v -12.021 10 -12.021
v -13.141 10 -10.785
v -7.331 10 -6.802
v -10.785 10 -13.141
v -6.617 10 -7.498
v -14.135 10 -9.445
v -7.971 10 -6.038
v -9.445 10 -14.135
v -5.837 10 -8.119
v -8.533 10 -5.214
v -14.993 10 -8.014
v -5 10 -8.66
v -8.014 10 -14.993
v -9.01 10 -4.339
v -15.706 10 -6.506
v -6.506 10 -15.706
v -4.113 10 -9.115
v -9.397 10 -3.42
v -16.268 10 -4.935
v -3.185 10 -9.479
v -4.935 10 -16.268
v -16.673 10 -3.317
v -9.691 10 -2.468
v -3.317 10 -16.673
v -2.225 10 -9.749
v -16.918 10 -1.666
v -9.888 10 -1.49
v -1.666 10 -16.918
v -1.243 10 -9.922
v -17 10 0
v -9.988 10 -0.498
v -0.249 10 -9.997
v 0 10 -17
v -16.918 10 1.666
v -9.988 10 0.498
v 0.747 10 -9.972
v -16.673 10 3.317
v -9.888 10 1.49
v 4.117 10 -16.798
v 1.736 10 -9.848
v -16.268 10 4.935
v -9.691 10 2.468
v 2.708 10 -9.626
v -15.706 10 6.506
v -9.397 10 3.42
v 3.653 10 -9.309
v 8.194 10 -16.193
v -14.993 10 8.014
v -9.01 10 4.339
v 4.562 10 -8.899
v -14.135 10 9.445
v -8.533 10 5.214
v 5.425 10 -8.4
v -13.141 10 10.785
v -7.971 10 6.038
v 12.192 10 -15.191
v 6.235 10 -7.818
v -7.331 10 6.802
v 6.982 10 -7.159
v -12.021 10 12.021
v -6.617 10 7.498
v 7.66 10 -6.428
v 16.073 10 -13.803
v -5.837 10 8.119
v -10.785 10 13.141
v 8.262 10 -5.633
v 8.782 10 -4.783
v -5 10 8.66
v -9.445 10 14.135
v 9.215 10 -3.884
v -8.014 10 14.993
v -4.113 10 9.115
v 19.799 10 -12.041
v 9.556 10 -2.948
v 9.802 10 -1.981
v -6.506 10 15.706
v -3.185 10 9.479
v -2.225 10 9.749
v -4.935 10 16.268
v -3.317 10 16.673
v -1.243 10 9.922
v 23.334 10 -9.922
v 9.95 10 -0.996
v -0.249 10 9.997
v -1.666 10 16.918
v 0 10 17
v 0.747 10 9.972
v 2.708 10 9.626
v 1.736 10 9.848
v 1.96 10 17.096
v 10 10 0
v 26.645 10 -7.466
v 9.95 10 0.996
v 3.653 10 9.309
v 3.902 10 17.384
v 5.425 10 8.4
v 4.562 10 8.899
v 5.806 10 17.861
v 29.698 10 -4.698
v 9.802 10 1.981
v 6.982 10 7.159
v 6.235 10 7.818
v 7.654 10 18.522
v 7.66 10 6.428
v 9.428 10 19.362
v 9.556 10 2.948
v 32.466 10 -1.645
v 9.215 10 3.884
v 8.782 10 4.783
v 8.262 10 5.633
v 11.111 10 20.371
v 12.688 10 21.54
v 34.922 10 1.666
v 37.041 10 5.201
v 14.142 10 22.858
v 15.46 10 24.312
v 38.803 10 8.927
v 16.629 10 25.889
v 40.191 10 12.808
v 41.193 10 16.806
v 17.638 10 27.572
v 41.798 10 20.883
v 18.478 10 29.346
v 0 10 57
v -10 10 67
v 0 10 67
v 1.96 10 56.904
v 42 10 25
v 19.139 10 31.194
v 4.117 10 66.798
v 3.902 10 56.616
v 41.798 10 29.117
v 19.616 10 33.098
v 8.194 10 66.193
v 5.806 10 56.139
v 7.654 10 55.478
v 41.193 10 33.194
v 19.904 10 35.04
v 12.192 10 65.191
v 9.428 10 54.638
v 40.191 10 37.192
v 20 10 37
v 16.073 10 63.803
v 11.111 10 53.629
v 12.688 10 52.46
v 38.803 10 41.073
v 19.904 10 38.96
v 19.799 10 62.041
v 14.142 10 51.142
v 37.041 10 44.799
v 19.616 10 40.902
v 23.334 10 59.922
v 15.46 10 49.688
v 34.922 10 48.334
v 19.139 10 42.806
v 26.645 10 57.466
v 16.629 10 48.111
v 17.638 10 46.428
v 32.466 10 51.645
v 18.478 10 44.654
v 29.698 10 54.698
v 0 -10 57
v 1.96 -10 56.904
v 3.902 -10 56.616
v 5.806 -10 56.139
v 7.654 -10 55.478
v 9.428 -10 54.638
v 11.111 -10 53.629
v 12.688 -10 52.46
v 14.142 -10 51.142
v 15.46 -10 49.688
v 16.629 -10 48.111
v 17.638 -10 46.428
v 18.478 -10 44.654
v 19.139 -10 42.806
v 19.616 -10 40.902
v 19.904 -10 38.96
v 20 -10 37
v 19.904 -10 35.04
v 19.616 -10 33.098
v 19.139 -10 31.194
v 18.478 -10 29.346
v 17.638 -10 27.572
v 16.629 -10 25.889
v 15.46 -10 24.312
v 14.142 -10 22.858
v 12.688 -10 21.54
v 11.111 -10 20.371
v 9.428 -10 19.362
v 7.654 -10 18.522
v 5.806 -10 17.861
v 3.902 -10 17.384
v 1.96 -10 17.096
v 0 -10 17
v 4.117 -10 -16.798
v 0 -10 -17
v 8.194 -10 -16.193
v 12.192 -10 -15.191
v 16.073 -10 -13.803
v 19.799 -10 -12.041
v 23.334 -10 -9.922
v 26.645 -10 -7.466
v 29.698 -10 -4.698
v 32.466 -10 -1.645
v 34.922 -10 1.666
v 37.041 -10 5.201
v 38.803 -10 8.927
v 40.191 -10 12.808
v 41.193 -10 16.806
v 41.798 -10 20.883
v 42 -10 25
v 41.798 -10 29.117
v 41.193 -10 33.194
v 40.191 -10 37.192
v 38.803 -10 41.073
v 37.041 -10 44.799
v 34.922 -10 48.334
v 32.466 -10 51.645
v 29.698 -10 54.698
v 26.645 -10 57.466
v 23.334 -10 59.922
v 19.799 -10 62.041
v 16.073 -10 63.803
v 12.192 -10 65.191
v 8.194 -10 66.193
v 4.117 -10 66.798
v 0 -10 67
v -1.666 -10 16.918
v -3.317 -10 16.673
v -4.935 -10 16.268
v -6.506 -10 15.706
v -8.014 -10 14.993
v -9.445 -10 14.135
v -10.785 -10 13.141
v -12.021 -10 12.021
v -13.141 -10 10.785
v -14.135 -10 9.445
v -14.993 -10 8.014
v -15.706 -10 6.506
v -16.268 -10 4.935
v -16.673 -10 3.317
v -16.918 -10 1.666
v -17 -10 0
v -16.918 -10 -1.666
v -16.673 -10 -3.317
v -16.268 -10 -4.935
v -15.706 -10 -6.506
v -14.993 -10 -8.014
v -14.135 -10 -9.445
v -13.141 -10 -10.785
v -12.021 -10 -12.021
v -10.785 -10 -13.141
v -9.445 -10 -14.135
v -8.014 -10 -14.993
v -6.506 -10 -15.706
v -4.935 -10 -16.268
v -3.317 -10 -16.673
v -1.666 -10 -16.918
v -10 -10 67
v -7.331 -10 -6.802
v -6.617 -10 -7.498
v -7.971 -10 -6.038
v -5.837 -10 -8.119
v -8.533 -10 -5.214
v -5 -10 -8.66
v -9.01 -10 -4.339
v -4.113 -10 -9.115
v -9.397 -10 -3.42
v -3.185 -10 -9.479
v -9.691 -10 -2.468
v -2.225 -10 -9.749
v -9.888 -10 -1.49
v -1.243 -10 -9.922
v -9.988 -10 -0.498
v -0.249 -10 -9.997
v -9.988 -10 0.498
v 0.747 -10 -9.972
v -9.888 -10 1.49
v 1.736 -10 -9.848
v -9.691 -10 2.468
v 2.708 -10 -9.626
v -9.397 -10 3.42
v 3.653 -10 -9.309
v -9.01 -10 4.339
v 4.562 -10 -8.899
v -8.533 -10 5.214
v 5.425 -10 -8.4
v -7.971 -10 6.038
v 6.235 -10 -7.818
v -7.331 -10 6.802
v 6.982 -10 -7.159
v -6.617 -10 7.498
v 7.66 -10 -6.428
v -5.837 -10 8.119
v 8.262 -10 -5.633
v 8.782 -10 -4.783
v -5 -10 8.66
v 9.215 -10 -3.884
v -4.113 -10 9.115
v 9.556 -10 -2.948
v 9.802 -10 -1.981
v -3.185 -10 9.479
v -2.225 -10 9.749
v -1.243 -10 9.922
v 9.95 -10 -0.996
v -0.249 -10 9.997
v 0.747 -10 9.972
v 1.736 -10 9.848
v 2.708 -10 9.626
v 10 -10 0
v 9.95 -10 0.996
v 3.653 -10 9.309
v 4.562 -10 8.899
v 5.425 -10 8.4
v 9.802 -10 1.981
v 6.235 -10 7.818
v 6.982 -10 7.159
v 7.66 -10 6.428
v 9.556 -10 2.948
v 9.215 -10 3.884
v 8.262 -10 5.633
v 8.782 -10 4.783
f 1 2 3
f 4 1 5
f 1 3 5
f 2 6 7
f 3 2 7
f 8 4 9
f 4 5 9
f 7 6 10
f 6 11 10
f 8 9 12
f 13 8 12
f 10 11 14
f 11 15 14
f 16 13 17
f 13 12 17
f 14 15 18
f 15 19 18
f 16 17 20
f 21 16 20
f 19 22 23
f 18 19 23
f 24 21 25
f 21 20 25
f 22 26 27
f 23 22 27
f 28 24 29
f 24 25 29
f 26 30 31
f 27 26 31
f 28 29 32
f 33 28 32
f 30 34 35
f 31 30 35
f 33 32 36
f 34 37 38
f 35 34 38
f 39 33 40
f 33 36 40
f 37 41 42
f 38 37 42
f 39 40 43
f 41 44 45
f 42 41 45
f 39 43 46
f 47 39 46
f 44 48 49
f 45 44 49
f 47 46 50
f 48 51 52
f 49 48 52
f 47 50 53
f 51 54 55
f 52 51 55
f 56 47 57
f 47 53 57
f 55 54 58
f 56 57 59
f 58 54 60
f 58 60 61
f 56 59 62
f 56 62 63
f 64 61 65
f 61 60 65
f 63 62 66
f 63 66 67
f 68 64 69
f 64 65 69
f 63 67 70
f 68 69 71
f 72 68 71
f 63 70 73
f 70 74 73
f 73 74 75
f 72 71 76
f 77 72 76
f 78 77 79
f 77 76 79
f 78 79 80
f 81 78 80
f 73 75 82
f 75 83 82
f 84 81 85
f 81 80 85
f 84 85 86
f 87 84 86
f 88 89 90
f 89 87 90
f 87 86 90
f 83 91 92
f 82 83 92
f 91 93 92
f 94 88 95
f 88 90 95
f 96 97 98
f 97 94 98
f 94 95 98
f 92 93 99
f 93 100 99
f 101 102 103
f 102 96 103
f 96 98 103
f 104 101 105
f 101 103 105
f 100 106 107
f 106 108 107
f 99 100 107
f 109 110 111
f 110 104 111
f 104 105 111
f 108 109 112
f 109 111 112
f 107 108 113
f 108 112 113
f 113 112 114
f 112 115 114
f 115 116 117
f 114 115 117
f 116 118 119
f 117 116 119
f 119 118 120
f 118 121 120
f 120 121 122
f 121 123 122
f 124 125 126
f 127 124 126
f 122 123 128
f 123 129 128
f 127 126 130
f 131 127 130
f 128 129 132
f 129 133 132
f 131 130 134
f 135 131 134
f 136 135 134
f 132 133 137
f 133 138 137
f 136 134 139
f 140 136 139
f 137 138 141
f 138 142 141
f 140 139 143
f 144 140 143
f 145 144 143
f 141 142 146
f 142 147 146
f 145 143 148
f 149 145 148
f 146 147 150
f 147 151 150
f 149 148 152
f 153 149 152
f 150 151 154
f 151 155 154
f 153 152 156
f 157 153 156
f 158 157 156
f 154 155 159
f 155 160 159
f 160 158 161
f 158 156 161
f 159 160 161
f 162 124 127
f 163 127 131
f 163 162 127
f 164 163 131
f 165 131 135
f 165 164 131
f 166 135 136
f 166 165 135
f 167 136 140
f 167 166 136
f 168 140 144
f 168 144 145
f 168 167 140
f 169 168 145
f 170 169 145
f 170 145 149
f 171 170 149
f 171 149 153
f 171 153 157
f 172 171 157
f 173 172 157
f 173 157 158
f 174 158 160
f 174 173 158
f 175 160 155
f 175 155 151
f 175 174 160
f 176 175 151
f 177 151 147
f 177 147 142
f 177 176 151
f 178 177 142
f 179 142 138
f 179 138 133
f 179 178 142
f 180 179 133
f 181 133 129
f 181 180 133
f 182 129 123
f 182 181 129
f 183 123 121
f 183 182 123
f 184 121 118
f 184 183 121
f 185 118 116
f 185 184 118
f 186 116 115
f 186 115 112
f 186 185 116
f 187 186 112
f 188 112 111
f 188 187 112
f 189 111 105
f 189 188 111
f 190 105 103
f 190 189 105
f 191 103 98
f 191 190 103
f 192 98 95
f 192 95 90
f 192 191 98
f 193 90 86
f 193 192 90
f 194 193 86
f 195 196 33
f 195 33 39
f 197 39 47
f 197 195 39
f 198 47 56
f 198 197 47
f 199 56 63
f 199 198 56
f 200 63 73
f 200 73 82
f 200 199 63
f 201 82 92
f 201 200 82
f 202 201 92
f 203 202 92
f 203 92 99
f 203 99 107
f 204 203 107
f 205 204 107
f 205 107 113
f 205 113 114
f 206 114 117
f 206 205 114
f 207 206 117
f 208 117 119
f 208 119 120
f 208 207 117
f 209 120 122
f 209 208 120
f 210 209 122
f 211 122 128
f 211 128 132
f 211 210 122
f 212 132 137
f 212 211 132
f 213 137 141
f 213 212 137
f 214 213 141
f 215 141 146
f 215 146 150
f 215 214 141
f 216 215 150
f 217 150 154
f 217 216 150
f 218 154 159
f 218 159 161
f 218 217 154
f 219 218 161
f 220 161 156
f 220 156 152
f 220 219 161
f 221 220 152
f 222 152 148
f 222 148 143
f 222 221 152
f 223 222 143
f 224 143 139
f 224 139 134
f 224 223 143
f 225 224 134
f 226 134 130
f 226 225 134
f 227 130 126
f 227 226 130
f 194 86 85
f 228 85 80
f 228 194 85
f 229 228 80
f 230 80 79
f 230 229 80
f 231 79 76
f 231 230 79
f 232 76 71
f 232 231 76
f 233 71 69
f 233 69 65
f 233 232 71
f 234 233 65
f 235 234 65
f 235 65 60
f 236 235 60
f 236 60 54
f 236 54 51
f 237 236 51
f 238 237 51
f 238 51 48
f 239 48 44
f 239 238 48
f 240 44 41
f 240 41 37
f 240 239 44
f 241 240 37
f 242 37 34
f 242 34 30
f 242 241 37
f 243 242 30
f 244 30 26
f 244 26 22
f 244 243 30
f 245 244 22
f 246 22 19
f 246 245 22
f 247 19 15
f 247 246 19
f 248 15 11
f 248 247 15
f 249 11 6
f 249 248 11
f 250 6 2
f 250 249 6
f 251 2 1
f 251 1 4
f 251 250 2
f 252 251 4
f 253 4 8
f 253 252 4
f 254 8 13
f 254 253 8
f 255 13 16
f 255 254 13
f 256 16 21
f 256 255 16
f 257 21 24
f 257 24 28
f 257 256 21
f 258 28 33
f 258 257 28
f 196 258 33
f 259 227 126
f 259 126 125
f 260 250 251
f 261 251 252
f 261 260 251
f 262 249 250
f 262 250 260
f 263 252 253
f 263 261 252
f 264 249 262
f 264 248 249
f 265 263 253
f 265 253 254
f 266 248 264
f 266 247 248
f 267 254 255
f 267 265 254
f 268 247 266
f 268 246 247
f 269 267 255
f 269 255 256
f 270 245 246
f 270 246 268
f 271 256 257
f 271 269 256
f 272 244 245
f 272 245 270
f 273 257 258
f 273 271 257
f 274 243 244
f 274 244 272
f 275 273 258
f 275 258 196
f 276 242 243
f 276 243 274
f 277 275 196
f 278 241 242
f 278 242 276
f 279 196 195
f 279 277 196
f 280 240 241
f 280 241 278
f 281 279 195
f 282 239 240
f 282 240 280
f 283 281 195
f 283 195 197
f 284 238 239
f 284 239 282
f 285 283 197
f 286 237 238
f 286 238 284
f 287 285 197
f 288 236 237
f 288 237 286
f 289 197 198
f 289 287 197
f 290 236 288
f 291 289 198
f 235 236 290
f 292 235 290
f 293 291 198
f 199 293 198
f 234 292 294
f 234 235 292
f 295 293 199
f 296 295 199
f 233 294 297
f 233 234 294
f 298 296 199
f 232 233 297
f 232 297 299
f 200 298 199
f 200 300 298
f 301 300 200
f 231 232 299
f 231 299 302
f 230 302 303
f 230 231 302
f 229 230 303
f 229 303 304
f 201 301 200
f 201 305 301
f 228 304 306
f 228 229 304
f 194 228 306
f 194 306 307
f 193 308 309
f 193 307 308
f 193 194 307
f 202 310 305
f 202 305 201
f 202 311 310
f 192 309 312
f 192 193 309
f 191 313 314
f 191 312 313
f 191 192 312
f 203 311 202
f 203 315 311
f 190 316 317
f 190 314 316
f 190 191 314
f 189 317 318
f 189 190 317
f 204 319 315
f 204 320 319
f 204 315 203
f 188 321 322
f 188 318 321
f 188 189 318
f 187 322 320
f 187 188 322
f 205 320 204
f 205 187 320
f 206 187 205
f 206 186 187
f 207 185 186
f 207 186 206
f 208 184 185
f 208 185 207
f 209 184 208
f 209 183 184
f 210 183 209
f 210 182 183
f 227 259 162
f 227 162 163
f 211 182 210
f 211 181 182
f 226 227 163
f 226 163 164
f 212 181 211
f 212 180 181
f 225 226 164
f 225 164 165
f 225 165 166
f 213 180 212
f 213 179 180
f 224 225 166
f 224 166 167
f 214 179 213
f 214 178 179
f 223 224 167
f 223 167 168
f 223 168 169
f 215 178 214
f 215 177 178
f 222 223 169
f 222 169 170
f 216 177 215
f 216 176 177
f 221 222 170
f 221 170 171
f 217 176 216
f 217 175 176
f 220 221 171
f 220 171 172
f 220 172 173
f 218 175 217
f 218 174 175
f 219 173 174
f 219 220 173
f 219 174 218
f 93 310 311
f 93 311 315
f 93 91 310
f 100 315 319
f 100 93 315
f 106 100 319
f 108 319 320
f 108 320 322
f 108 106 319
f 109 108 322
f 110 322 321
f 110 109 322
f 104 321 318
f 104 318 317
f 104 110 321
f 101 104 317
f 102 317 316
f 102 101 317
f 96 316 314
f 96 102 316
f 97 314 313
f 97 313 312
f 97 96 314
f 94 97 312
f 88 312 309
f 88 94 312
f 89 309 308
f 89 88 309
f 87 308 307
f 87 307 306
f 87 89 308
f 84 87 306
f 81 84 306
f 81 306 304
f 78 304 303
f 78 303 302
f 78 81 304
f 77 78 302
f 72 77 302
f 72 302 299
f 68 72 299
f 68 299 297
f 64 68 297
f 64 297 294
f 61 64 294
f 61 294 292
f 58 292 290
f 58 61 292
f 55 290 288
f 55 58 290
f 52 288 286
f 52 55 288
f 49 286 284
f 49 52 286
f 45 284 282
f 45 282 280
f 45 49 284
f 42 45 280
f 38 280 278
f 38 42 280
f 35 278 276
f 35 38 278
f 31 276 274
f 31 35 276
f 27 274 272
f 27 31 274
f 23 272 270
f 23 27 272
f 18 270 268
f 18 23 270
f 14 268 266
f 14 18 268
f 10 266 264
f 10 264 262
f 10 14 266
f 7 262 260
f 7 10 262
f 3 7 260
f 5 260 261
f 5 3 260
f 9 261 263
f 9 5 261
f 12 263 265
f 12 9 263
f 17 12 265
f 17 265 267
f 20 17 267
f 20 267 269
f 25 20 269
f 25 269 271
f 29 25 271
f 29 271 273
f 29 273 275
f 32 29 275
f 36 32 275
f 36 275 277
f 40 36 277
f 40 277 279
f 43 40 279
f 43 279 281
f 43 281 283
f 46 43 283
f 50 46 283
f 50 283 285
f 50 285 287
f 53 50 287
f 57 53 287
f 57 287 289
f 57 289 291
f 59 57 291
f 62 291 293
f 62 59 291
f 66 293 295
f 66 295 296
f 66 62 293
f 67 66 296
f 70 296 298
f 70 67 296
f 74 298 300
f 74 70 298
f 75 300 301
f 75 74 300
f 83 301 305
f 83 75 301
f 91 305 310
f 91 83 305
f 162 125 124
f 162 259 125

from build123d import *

# Parameters (mm, degrees)
F0_R     = 10
F1_DEPTH = 10


with BuildPart() as f1:
    # F0 (on Front) → F1 (new body, symmetric)
    with BuildSketch(Plane.XZ):
        with BuildLine():
            ThreePointArc((0, 17), (-17, 0), (0, -17))
            ThreePointArc((0, -17), (42, 25), (0, 67))
            Line((0, 67), (-10, 67))
            Line((-10, 67), (0, 57))
            ThreePointArc((0, 57), (20, 37), (0, 17))
        make_face()
        Circle(F0_R, mode=Mode.SUBTRACT)
    extrude(amount=F1_DEPTH, both=True)


solid = f1.part
